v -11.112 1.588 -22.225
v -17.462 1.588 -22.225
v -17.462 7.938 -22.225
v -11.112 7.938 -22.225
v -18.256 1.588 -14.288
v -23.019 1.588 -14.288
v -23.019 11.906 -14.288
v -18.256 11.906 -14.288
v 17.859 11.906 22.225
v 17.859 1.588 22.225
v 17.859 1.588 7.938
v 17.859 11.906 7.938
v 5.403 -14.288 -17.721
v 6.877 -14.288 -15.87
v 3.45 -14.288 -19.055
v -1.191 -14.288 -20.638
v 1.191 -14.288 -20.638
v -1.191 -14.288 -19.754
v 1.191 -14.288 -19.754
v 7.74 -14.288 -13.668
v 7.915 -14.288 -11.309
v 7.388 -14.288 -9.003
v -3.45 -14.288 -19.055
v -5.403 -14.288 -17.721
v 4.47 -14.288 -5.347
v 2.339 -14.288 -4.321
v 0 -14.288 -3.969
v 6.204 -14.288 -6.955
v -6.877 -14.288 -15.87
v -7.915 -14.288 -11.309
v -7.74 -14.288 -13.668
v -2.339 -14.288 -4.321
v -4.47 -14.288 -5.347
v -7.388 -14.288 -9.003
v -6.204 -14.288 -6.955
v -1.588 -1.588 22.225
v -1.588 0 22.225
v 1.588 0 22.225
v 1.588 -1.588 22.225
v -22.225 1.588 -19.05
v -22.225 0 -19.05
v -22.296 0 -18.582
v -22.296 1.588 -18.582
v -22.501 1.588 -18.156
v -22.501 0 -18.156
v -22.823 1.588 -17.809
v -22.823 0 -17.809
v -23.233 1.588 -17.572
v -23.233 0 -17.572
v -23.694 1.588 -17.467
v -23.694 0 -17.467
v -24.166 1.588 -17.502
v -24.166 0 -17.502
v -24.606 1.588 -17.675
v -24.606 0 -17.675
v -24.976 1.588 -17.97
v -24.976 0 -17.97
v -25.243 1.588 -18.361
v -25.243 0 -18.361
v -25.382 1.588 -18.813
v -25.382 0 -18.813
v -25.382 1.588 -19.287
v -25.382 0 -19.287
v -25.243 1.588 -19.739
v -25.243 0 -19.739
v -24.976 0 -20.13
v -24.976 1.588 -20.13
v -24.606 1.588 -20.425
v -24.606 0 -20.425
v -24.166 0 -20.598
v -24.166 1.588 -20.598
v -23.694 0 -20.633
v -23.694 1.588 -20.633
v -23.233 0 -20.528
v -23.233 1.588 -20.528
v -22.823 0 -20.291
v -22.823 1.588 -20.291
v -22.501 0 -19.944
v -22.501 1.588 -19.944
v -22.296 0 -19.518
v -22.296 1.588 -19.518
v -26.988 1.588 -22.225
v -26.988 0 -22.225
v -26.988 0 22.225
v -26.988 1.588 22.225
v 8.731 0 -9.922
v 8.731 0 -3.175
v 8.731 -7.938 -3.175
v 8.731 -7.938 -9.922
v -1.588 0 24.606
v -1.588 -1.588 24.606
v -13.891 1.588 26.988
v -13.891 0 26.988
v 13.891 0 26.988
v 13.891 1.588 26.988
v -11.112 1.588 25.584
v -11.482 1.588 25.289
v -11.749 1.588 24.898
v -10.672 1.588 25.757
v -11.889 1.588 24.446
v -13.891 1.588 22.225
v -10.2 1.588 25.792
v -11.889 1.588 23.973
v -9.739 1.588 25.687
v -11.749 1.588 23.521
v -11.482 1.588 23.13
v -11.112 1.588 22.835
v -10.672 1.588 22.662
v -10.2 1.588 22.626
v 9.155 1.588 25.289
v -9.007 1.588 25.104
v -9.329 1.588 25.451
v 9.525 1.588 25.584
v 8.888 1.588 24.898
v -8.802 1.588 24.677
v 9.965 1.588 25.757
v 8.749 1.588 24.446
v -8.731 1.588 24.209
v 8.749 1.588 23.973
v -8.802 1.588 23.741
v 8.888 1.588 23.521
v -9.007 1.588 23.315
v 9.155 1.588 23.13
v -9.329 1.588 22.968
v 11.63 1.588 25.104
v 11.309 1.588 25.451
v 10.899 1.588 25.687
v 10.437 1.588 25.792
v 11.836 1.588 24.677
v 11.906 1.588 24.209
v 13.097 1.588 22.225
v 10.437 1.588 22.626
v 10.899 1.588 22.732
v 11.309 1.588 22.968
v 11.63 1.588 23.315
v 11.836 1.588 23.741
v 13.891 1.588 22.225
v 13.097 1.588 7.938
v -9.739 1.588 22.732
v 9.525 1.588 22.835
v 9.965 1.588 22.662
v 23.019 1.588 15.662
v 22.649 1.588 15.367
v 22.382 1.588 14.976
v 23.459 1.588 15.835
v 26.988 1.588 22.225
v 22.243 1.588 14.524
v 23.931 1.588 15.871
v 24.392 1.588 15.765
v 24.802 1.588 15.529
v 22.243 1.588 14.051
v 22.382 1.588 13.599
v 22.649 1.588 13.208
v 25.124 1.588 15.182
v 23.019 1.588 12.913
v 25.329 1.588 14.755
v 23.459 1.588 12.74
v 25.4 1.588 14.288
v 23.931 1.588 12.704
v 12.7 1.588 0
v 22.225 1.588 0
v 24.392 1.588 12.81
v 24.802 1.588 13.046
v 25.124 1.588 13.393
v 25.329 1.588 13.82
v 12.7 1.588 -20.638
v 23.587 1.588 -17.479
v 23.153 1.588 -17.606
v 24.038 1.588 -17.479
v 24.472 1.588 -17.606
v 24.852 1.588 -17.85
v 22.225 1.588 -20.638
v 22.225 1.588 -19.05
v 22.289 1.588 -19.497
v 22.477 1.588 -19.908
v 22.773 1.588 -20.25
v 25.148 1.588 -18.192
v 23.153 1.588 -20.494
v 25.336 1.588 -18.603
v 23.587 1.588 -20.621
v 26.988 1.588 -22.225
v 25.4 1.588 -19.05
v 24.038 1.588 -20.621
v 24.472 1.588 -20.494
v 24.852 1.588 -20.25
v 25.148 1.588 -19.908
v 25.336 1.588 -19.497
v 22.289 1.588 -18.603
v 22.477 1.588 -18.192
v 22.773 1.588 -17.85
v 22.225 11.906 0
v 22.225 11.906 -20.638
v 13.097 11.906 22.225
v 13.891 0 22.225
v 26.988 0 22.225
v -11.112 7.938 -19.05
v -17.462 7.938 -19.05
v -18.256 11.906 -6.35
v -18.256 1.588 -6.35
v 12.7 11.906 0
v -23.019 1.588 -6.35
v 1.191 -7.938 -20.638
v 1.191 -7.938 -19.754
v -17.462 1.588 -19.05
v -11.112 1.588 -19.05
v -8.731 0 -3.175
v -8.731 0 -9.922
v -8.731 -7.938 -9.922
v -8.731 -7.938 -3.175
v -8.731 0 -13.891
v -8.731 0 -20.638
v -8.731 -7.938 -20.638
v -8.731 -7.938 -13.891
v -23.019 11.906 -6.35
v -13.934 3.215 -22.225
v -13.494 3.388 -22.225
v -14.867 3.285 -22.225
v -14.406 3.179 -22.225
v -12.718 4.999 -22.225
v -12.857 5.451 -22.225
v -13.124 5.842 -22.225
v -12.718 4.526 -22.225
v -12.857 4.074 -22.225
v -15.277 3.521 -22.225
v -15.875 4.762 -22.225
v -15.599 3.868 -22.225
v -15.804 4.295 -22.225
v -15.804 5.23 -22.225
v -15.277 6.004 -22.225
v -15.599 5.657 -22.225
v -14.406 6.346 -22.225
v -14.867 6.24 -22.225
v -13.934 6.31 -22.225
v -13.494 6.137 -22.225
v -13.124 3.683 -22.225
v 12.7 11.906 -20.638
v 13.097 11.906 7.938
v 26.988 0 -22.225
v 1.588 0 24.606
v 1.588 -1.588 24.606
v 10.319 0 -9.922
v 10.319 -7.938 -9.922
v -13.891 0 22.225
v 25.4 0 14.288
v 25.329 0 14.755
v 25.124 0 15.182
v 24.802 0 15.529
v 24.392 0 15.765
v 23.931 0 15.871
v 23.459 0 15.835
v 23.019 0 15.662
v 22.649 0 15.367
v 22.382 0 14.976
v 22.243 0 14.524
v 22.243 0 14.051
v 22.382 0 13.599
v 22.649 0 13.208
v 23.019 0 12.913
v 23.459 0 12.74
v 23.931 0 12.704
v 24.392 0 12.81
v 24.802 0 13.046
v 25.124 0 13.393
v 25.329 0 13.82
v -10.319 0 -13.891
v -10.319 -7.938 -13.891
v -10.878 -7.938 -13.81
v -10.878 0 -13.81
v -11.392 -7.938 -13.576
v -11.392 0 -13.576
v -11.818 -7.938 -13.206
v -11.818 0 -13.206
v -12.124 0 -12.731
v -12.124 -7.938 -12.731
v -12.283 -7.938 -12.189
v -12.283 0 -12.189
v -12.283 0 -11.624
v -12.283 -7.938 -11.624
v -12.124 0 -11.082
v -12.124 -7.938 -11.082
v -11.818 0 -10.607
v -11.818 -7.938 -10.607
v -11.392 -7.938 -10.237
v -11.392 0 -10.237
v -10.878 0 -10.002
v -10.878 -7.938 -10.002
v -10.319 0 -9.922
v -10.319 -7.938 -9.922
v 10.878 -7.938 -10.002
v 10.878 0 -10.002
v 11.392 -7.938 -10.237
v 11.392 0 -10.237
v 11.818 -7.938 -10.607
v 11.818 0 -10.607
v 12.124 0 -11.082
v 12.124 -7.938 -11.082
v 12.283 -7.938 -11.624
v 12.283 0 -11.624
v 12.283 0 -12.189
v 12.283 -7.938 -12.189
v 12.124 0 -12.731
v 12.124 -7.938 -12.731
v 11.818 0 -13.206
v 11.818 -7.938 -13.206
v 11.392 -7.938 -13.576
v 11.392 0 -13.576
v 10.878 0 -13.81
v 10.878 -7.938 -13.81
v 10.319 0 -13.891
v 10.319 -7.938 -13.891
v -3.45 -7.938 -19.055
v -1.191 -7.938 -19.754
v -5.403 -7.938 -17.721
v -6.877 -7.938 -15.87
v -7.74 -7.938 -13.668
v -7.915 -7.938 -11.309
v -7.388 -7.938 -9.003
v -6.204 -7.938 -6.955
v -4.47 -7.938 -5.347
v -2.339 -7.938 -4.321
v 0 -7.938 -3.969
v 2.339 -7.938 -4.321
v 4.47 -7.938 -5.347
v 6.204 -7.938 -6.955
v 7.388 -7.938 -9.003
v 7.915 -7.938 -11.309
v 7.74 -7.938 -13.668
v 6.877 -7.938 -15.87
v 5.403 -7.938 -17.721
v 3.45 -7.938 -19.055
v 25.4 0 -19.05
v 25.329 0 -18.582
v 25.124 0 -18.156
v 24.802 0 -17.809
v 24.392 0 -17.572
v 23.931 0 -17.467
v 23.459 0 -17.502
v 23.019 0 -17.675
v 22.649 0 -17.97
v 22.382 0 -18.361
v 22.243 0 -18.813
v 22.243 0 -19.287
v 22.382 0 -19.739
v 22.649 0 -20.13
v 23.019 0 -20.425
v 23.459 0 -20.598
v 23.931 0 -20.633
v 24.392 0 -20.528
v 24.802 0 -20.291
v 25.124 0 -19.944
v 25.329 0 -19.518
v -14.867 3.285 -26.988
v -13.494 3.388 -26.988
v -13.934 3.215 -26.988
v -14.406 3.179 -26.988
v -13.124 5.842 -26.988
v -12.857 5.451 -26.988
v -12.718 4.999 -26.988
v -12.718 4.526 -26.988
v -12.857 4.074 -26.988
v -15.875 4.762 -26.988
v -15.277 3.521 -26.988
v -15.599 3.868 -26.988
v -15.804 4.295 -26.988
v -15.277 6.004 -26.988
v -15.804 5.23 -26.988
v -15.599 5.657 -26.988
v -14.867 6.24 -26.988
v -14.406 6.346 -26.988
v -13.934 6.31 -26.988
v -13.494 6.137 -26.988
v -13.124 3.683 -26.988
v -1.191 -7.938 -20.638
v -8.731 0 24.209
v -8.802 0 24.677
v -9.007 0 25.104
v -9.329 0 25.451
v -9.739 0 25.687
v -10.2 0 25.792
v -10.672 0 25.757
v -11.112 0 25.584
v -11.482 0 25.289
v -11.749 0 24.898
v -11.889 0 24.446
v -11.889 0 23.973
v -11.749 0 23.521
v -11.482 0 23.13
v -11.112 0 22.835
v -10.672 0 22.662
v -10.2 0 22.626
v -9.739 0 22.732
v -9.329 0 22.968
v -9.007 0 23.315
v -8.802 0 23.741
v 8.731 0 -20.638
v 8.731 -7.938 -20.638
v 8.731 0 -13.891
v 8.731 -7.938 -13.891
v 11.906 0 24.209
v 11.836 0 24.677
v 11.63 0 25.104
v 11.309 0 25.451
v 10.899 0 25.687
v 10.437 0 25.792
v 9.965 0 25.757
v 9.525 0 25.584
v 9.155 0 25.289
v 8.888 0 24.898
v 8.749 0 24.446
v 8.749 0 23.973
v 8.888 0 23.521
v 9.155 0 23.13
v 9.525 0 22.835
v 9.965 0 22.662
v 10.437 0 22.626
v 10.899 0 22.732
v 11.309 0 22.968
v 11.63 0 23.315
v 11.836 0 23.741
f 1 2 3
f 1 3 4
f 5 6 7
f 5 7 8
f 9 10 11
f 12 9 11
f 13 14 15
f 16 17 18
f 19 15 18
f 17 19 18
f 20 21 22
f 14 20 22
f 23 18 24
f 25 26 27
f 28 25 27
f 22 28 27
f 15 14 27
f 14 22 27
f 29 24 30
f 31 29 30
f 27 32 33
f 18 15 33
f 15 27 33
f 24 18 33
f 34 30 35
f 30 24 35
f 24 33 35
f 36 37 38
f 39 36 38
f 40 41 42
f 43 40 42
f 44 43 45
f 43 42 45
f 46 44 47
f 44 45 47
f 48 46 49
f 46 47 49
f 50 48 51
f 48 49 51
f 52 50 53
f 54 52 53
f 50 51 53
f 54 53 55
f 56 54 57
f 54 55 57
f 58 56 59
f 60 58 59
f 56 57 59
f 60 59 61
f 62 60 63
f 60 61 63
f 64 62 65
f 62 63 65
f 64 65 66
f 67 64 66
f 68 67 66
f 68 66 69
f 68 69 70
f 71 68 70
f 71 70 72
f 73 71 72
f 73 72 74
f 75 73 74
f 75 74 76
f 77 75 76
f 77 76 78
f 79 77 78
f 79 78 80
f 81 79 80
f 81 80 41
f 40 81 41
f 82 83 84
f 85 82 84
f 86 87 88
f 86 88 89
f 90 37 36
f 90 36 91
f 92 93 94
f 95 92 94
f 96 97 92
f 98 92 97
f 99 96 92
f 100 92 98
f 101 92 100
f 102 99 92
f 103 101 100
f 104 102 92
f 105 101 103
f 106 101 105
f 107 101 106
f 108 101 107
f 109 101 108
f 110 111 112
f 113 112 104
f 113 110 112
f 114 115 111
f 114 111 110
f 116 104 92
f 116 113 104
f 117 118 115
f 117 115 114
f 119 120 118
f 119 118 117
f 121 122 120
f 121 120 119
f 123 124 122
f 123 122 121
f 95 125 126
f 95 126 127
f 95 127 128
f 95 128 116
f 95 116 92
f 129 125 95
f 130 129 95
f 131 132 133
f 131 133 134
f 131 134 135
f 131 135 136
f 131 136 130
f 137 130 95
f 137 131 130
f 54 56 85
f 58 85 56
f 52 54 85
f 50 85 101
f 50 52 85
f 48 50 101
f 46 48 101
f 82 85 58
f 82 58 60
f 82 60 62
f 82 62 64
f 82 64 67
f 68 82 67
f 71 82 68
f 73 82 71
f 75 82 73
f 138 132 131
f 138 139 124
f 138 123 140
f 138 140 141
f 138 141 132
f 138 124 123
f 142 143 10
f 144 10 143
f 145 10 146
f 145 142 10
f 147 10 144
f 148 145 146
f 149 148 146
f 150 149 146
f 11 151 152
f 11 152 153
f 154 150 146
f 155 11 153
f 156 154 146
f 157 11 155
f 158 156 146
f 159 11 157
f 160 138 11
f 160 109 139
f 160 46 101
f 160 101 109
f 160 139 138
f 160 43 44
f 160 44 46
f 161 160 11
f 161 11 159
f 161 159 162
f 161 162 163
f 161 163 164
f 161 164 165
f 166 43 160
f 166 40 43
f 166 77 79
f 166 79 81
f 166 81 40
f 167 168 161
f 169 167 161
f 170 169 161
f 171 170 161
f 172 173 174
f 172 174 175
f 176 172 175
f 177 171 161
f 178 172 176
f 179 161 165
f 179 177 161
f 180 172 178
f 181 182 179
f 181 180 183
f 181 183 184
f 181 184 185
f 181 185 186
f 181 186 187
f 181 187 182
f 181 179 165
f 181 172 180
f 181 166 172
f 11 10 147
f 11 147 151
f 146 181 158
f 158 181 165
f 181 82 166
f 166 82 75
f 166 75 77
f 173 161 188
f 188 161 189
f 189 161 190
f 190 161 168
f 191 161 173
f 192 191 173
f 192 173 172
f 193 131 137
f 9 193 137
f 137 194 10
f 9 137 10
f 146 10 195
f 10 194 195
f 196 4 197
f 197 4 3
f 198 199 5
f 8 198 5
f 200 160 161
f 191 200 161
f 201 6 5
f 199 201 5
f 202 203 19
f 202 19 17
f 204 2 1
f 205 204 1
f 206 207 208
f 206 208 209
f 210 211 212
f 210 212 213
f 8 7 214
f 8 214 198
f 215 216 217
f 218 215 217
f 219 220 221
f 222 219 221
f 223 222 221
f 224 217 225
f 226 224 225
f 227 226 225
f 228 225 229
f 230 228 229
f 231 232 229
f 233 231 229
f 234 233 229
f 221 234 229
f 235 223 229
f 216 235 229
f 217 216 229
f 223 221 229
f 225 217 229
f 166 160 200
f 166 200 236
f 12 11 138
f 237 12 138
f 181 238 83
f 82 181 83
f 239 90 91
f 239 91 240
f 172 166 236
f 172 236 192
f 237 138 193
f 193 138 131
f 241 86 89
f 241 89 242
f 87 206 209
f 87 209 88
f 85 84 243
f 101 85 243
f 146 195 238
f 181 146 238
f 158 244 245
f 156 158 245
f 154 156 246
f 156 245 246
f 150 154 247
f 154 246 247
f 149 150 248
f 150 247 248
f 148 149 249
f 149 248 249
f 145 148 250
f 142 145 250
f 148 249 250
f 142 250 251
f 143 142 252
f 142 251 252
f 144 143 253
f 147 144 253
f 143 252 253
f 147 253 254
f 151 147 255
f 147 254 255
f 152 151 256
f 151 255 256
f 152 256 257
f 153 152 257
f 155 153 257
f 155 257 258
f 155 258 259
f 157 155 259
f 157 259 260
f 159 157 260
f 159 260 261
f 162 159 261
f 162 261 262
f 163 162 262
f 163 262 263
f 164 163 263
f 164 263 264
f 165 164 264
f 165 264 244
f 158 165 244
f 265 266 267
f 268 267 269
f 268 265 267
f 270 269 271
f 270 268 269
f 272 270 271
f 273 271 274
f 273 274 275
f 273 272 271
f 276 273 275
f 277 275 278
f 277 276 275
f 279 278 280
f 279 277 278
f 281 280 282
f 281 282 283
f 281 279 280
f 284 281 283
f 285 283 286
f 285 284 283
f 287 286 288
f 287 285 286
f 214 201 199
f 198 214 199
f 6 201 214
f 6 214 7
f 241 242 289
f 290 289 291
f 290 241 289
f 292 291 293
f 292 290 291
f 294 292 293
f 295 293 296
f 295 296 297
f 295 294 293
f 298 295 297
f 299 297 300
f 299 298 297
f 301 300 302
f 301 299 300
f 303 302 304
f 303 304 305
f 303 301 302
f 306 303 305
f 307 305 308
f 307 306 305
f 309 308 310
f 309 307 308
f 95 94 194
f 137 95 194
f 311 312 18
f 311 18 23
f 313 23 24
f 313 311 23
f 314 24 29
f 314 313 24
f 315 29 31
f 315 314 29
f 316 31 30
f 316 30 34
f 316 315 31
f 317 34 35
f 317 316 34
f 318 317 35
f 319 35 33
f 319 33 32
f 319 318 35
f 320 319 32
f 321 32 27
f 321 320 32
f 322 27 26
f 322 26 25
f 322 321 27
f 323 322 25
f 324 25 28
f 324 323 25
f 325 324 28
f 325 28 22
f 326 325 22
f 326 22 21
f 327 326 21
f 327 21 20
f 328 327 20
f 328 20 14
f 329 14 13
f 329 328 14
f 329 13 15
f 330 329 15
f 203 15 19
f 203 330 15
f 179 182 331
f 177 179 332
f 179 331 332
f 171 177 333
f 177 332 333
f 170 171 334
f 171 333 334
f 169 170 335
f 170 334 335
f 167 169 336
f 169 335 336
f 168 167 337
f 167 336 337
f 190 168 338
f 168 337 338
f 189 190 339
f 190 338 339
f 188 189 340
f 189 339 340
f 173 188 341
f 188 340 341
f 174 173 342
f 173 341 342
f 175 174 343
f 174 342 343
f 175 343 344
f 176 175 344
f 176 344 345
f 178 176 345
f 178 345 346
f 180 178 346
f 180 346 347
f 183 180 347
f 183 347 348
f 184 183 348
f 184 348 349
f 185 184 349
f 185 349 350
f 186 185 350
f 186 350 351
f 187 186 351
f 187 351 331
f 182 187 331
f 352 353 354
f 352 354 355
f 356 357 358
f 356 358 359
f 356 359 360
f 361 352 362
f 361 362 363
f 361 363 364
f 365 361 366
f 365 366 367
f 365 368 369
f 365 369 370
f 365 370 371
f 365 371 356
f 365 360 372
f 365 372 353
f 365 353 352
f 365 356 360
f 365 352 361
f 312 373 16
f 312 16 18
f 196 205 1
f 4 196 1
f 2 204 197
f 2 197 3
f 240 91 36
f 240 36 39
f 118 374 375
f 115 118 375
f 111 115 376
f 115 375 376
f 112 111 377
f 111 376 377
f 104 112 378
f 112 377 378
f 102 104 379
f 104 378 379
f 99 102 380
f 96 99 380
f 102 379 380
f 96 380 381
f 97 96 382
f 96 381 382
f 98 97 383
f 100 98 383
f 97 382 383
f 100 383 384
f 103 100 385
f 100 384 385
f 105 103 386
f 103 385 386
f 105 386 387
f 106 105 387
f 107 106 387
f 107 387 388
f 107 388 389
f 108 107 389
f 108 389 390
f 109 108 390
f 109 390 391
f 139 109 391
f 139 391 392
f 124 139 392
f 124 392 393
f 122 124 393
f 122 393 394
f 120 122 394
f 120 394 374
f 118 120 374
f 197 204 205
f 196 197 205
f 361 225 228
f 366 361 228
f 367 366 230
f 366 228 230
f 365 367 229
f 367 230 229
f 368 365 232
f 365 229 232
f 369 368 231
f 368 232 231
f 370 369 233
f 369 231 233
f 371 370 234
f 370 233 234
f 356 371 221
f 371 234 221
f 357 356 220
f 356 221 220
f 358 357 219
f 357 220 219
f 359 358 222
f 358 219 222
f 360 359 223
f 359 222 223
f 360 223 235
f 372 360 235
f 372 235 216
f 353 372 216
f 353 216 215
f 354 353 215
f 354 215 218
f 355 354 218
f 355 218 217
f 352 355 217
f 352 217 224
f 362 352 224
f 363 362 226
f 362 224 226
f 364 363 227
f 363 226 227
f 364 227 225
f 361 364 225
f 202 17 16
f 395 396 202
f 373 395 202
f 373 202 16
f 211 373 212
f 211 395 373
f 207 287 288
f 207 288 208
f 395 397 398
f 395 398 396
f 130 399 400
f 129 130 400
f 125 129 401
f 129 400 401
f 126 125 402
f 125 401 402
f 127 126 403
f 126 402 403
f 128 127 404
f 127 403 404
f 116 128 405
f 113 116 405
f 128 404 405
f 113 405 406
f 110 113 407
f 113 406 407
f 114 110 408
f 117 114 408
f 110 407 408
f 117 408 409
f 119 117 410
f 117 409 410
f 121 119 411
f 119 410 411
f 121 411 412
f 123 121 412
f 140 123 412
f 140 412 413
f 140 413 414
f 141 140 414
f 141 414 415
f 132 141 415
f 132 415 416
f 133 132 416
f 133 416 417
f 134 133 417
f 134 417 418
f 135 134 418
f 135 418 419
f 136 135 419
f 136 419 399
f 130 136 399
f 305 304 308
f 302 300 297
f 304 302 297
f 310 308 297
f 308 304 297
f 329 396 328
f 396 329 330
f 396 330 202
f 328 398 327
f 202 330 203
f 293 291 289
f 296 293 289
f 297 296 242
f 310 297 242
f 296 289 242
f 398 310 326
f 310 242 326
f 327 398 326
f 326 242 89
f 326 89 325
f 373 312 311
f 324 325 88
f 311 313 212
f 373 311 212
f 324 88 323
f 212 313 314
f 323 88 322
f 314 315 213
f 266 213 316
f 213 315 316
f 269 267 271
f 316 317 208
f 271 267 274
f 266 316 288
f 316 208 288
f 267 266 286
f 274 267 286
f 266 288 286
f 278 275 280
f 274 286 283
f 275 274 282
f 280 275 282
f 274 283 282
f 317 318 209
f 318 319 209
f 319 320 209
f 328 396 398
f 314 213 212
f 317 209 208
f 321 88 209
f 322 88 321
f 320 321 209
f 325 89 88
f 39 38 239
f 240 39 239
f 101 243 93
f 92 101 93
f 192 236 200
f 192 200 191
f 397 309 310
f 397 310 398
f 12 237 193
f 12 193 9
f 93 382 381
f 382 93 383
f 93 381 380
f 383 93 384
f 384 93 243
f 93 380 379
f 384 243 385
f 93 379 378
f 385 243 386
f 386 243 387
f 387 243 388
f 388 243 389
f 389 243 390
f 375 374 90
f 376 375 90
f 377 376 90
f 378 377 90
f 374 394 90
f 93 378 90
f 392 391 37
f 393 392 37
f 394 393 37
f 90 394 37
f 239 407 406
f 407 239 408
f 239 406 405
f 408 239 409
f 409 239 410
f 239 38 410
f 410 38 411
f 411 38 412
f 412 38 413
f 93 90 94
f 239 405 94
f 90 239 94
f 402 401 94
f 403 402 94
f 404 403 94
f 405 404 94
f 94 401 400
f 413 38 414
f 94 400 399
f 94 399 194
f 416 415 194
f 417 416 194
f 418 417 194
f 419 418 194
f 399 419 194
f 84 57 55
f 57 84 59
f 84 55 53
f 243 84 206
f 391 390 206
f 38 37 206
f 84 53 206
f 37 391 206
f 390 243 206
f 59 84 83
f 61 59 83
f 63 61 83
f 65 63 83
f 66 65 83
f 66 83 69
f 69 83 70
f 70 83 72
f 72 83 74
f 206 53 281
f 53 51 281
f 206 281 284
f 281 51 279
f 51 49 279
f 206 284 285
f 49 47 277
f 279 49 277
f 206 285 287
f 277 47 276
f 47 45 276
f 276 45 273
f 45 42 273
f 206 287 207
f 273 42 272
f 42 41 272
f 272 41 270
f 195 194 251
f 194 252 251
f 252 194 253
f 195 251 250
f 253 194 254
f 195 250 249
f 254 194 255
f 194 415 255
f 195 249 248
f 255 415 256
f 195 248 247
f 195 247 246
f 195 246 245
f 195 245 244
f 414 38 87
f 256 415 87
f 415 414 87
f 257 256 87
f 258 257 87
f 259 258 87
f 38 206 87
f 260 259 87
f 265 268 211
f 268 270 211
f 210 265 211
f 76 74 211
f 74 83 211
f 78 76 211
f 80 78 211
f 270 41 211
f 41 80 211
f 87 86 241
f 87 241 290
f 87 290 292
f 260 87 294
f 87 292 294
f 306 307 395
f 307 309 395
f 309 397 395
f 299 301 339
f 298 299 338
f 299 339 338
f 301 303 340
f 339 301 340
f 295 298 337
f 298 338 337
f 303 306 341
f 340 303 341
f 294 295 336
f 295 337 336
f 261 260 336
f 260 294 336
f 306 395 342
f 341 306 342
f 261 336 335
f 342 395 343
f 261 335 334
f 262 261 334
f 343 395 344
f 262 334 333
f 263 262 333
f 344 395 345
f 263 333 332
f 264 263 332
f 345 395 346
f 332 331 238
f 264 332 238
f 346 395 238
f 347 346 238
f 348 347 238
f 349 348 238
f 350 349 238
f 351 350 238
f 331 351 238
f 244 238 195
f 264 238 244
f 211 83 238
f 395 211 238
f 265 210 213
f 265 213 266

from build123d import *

# Parameters (mm, degrees)
BOSS_EXTRUDE1_DEPTH   = 1.5875
SKETCH2_W             = 4.7625
SKETCH2_H             = 7.9375
BOSS_EXTRUDE2_DEPTH   = 10.31875
SKETCH2_W_2           = 6.35
SKETCH2_H_2           = 3.175
BOSS_EXTRUDE2_2_DEPTH = 10.31875
SKETCH2_3_W           = 9.525
SKETCH2_3_H           = 20.6375
BOSS_EXTRUDE7_DEPTH   = 10.31875
BOSS_EXTRUDE8_DEPTH   = 10.31875
SKETCH3_R             = 1.5875
BOSS_EXTRUDE3_DEPTH   = 4.7625
SKETCH4_W             = 6.35
SKETCH4_H             = 3.96875
CUT_EXTRUDE1_DEPTH    = 50.2125
BOSS_EXTRUDE4_DEPTH   = 7.9375
BOSS_EXTRUDE5_DEPTH   = 6.35
SKETCH7_R             = 1.5875
CUT_EXTRUDE2_DEPTH    = 12.90625
SKETCH9_W             = 3.175
SKETCH9_H             = 2.38125
BOSS_EXTRUDE6_DEPTH   = 1.5875


with BuildPart() as part:
    # Sketch1 → Boss-Extrude1 (new body)
    with BuildSketch(Plane(origin=(0, 0, 0), x_dir=(1, 0, 0), z_dir=(0, 1, 0))):
        Polygon((13.890625, -22.225), (26.9875, -22.225), (26.9875, 22.225), (-26.9875, 22.225), (-26.9875, -22.225), (-13.890625, -22.225), (-13.890625, -26.9875), (13.890625, -26.9875), align=None)
    extrude(amount=BOSS_EXTRUDE1_DEPTH)

    # Sketch2<3> → Boss-Extrude7 (add)
    with BuildSketch(Plane(origin=(0, 1.5875, 0), x_dir=(1, 0, 0), z_dir=(0, 1, 0))):
        with Locations((17.4625, 10.31875)):
            Rectangle(SKETCH2_3_W, SKETCH2_3_H)
    extrude(amount=BOSS_EXTRUDE7_DEPTH)

    # Sketch2<4> → Boss-Extrude8 (add)
    with BuildSketch(Plane(origin=(0, 1.5875, 0), x_dir=(1, 0, 0), z_dir=(0, 1, 0))):
        Polygon((13.096875, -7.9375), (13.096875, -22.225), (13.890625, -22.225), (17.859375, -22.225), (17.859375, -7.9375), align=None)
    extrude(amount=BOSS_EXTRUDE8_DEPTH)

    # Sketch5 → Boss-Extrude4 (add)
    with BuildSketch(Plane.XZ):
        with BuildLine():
            Line((8.73125, -20.6375), (-8.73125, -20.6375))
            Line((-8.73125, -20.6375), (-8.73125, -13.890625))
            Line((-8.73125, -13.890625), (-10.31875, -13.890625))
            ThreePointArc((-10.31875, -13.890625), (-12.303125, -11.90625), (-10.31875, -9.921875))
            Line((-10.31875, -9.921875), (-8.73125, -9.921875))
            Line((-8.73125, -9.921875), (-8.73125, -3.175))
            Line((-8.73125, -3.175), (8.73125, -3.175))
            Line((8.73125, -3.175), (8.73125, -9.921875))
            Line((8.73125, -9.921875), (10.31875, -9.921875))
            ThreePointArc((10.31875, -9.921875), (12.303125, -11.90625), (10.31875, -13.890625))
            Line((10.31875, -13.890625), (8.73125, -13.890625))
            Line((8.73125, -13.890625), (8.73125, -20.6375))
        make_face()
    extrude(amount=BOSS_EXTRUDE4_DEPTH)

    # Sketch6 → Boss-Extrude5 (add)
    with BuildSketch(Plane.XZ.offset(7.9375)):
        with BuildLine():
            Line((1.190625, -20.6375), (-1.190625, -20.6375))
            Line((-1.190625, -20.6375), (-1.190625, -19.753945099))
            ThreePointArc((-1.190625, -19.753945099), (0, -3.96875), (1.190625, -19.753945099))
            Line((1.190625, -19.753945099), (1.190625, -20.6375))
        make_face()
    extrude(amount=BOSS_EXTRUDE5_DEPTH)

    # Sketch7 → Cut-Extrude2 (cut, through all)
    with BuildSketch(Plane.XZ):
        with Locations((23.8125, -19.05)):
            Circle(SKETCH7_R)
        with Locations((-23.8125, -19.05)):
            Circle(SKETCH7_R)
        with Locations((-10.31875, 24.209375)):
            Circle(SKETCH7_R)
        with Locations((10.31875, 24.209375)):
            Circle(SKETCH7_R)
        with Locations((23.8125, 14.2875)):
            Circle(SKETCH7_R)
    extrude(amount=-CUT_EXTRUDE2_DEPTH, mode=Mode.SUBTRACT)

    # Sketch9 → Boss-Extrude6 (add)
    with BuildSketch(Plane.XZ):
        with Locations((0, 23.415625)):
            Rectangle(SKETCH9_W, SKETCH9_H)
    extrude(amount=BOSS_EXTRUDE6_DEPTH)


with BuildPart() as body_2:
    # Sketch2 → Boss-Extrude2 (new body)
    with BuildSketch(Plane(origin=(0, 1.5875, 0), x_dir=(1, 0, 0), z_dir=(0, 1, 0))):
        with Locations((-20.6375, 10.31875)):
            Rectangle(SKETCH2_W, SKETCH2_H)
    extrude(amount=BOSS_EXTRUDE2_DEPTH)


with BuildPart() as body_3:
    # Sketch2 → Boss-Extrude2 2 (new body)
    with BuildSketch(Plane(origin=(0, 1.5875, 0), x_dir=(1, 0, 0), z_dir=(0, 1, 0))):
        with Locations((-14.2875, 20.6375)):
            Rectangle(SKETCH2_W_2, SKETCH2_H_2)
    extrude(amount=BOSS_EXTRUDE2_2_DEPTH)

    # Sketch4 → Cut-Extrude1 (cut, through all)
    with BuildSketch(Plane(origin=(0, 0, -22.225), x_dir=(-1, 0, 0), z_dir=(0, 0, -1))):
        with Locations((14.2875, 9.921875)):
            Rectangle(SKETCH4_W, SKETCH4_H)
    extrude(amount=-CUT_EXTRUDE1_DEPTH, mode=Mode.SUBTRACT)


with BuildPart() as body_4:
    # Sketch3 → Boss-Extrude3 (new body)
    with BuildSketch(Plane(origin=(0, 0, -22.225), x_dir=(-1, 0, 0), z_dir=(0, 0, -1))):
        with Locations((14.2875, 4.7625)):
            Circle(SKETCH3_R)
    extrude(amount=BOSS_EXTRUDE3_DEPTH)


solid = Compound([part.part, body_2.part, body_3.part, body_4.part])
